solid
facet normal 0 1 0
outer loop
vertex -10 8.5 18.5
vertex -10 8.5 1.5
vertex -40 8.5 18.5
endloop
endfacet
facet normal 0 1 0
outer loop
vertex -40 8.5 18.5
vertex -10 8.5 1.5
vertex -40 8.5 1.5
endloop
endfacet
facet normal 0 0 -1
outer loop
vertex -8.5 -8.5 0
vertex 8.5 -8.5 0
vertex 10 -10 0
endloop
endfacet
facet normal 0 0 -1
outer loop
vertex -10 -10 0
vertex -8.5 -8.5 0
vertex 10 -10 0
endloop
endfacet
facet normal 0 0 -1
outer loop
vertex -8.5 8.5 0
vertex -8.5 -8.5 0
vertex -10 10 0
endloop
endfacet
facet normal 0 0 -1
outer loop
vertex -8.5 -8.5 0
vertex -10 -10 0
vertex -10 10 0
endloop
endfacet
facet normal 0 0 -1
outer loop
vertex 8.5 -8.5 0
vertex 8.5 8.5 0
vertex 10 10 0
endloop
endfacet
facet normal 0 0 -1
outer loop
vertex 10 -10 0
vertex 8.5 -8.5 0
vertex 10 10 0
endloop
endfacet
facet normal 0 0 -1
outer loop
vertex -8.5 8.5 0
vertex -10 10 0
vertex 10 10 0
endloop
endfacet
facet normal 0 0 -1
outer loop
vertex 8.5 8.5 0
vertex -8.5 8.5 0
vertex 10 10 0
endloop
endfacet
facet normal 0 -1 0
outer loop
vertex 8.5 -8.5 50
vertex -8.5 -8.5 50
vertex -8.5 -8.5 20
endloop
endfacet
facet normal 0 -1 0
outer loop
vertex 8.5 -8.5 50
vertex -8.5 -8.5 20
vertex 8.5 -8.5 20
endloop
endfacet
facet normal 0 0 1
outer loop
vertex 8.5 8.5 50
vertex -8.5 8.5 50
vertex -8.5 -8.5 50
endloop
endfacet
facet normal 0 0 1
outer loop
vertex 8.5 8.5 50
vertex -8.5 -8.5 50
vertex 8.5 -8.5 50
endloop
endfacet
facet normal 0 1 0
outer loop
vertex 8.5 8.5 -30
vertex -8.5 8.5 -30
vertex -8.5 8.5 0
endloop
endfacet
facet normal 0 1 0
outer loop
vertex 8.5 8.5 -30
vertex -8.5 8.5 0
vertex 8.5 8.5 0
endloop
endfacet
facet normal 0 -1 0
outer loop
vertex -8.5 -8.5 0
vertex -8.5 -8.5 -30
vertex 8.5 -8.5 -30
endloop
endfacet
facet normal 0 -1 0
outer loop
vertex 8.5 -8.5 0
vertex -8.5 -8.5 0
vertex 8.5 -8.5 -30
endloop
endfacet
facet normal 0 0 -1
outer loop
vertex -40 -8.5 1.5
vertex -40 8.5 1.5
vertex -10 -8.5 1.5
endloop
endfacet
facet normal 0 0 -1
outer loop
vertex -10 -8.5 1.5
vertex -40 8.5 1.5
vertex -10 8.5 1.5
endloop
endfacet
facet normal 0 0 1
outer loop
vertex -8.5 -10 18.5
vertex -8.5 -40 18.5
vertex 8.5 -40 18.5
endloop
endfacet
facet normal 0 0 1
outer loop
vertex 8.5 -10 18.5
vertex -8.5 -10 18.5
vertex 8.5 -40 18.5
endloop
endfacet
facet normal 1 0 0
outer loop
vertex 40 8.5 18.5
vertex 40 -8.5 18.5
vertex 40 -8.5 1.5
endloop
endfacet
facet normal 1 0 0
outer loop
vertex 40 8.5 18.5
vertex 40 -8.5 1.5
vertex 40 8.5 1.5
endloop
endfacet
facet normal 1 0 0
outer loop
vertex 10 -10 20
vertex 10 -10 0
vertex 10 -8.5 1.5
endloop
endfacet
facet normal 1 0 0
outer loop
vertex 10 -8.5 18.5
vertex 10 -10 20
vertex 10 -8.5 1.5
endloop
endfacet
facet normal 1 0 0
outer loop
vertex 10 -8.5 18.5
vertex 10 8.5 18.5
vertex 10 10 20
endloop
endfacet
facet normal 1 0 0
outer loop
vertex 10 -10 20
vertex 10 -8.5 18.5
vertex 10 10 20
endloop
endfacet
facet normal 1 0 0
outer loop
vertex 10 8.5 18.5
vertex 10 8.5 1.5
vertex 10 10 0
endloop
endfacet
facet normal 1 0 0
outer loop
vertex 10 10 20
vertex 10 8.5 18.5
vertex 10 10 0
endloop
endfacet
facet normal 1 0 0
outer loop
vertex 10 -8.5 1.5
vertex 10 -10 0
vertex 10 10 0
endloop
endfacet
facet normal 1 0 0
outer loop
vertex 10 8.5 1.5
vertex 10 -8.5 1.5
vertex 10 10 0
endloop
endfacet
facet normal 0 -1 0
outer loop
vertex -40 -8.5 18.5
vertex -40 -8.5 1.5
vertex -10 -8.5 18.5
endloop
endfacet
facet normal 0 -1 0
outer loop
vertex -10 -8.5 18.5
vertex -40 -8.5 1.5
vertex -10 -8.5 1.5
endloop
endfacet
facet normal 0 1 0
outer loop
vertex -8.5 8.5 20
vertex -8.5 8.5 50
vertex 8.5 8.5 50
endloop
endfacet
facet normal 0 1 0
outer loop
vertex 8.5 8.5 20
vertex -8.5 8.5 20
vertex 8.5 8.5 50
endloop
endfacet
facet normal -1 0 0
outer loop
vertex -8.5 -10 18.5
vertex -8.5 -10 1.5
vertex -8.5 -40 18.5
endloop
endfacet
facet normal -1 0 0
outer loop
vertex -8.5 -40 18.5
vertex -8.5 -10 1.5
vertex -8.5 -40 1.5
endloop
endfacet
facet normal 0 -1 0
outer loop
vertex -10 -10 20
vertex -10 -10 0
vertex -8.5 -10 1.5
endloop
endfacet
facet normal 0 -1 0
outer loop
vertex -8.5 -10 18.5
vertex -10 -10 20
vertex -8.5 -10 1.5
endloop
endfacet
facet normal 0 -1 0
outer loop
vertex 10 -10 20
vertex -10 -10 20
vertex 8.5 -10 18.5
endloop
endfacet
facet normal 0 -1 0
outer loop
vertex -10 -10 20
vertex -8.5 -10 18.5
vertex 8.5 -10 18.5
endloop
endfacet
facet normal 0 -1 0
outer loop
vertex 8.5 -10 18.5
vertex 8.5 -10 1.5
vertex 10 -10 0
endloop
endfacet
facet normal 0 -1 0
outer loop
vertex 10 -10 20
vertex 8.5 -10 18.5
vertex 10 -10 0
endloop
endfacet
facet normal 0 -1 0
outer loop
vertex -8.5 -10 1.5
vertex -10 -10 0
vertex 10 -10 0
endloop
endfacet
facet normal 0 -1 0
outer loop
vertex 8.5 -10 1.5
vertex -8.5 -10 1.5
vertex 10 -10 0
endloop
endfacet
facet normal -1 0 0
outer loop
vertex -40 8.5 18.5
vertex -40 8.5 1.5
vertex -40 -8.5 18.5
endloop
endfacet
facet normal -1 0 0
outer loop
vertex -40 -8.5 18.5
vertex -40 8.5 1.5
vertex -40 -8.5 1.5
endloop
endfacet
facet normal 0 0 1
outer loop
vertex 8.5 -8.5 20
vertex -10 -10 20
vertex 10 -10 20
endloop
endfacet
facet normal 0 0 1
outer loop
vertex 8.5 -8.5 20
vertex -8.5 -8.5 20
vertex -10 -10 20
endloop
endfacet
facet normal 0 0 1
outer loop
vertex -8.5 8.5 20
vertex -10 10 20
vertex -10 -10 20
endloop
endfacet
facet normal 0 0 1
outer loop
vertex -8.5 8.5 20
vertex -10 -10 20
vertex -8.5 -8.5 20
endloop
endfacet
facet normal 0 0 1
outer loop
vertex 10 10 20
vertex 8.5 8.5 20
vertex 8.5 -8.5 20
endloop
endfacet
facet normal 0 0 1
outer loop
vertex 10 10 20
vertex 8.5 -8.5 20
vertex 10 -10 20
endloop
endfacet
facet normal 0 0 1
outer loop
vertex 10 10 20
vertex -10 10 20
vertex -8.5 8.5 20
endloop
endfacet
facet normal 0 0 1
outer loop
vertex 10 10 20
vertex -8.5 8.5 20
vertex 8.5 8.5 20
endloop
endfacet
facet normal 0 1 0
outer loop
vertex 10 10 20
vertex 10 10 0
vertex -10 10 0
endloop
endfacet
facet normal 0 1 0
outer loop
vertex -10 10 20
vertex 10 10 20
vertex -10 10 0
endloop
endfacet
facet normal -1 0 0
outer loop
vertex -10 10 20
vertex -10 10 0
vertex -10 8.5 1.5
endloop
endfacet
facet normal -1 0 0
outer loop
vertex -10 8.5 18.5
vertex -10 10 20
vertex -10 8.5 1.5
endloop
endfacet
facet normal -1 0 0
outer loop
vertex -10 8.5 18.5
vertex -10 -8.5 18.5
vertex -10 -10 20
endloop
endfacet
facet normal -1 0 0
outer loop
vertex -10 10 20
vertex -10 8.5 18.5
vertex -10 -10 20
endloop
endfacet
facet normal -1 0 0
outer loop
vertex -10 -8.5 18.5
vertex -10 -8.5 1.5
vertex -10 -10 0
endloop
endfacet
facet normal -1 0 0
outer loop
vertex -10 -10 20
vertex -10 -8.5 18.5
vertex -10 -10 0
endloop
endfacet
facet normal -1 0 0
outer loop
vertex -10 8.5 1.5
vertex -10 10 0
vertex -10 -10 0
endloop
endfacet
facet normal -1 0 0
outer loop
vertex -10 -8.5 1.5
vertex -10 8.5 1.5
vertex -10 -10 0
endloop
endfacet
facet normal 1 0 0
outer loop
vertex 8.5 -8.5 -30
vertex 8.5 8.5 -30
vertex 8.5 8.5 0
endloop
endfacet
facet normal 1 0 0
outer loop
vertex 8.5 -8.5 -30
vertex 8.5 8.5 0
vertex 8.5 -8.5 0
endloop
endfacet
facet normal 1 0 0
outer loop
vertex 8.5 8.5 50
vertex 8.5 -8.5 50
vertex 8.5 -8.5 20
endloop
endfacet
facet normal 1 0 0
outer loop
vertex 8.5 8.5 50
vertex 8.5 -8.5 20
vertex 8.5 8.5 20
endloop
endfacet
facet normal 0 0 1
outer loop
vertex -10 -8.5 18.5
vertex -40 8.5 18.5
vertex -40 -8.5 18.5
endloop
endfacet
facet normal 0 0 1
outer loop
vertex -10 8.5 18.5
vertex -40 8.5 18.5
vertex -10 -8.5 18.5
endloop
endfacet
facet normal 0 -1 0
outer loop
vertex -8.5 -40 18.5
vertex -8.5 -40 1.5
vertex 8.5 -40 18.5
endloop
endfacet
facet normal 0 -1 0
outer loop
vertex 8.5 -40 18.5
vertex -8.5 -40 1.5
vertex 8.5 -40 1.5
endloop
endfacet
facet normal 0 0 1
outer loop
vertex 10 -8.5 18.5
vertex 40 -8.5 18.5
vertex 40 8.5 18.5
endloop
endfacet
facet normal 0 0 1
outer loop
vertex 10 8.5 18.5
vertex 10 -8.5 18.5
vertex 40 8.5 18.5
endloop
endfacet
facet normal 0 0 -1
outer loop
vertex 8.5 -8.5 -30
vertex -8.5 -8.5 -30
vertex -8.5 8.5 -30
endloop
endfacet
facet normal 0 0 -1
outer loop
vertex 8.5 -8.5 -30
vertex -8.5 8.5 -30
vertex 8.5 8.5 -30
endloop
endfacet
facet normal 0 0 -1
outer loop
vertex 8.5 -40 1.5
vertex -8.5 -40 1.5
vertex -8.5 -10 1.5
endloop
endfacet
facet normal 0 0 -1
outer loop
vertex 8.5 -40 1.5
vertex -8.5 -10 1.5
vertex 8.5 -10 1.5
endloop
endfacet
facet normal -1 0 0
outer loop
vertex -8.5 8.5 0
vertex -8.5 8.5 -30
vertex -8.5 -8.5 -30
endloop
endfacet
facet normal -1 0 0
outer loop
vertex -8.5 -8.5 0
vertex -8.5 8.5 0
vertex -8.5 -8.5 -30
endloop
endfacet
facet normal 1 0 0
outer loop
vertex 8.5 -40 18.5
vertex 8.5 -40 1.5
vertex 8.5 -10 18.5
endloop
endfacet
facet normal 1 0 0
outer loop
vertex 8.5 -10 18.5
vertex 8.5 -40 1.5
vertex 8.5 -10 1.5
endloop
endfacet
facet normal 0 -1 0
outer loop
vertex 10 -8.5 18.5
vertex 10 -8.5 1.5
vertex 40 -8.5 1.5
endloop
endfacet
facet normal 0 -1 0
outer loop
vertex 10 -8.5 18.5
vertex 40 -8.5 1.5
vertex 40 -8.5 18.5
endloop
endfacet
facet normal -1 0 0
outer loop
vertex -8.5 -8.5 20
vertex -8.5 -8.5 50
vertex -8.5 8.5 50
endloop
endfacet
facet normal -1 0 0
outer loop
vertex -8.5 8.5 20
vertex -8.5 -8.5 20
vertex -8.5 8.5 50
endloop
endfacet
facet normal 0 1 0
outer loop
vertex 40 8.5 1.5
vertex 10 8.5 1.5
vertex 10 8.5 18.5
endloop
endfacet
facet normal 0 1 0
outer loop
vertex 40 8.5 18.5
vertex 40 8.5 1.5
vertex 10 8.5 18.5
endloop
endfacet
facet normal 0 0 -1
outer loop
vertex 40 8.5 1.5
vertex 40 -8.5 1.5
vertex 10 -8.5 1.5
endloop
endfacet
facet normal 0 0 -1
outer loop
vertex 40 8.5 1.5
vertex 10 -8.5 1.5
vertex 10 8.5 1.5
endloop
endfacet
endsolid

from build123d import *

# Parameters (mm, degrees)
F1_DEPTH = 20
F2_START = 1.5
F2_DEPTH = 17
F3_W     = 17
F3_H     = 17
F4_DEPTH = 30
F5_W     = 17
F5_H     = 17
F6_DEPTH = 30
F7_W     = 17
F7_H     = 17
F8_DEPTH = 30


with BuildPart() as f1:
    # F0 (on Top) → F1 (new body)
    with BuildSketch(Plane.XY):
        Polygon((8.5, -10), (10, -10), (10, 10), (-10, 10), (-10, 8.5), (-10, 0), (-10, -8.5), (-10, -10), (-8.5, -10), (0, -10), align=None)
    extrude(amount=F1_DEPTH)

    # F0 (on Top) → F2 (join)
    with BuildSketch(Plane.XY.offset(F2_START)):
        Polygon((-10, 0), (-10, 8.5), (-40, 8.5), (-40, -8.5), (-10, -8.5), align=None)
        Polygon((8.5, -40), (8.5, -10), (0, -10), (-8.5, -10), (-8.5, -40), align=None)
    extrude(amount=F2_DEPTH)

    # F3 (on face) → F4 (join)
    with BuildSketch(Plane.XY.offset(20)):
        Rectangle(F3_W, F3_H)
    extrude(amount=F4_DEPTH)

    # F5 (on face) → F6 (join)
    with BuildSketch(Plane(origin=(0, 0, 0), x_dir=(1, 0, 0), z_dir=(0, 0, -1))):
        Rectangle(F5_W, F5_H)
    extrude(amount=F6_DEPTH)

    # F7 (on face) → F8 (join)
    with BuildSketch(Plane.YZ.offset(10)):
        with Locations((0, 10)):
            Rectangle(F7_W, F7_H)
    extrude(amount=F8_DEPTH)


solid = f1.part
